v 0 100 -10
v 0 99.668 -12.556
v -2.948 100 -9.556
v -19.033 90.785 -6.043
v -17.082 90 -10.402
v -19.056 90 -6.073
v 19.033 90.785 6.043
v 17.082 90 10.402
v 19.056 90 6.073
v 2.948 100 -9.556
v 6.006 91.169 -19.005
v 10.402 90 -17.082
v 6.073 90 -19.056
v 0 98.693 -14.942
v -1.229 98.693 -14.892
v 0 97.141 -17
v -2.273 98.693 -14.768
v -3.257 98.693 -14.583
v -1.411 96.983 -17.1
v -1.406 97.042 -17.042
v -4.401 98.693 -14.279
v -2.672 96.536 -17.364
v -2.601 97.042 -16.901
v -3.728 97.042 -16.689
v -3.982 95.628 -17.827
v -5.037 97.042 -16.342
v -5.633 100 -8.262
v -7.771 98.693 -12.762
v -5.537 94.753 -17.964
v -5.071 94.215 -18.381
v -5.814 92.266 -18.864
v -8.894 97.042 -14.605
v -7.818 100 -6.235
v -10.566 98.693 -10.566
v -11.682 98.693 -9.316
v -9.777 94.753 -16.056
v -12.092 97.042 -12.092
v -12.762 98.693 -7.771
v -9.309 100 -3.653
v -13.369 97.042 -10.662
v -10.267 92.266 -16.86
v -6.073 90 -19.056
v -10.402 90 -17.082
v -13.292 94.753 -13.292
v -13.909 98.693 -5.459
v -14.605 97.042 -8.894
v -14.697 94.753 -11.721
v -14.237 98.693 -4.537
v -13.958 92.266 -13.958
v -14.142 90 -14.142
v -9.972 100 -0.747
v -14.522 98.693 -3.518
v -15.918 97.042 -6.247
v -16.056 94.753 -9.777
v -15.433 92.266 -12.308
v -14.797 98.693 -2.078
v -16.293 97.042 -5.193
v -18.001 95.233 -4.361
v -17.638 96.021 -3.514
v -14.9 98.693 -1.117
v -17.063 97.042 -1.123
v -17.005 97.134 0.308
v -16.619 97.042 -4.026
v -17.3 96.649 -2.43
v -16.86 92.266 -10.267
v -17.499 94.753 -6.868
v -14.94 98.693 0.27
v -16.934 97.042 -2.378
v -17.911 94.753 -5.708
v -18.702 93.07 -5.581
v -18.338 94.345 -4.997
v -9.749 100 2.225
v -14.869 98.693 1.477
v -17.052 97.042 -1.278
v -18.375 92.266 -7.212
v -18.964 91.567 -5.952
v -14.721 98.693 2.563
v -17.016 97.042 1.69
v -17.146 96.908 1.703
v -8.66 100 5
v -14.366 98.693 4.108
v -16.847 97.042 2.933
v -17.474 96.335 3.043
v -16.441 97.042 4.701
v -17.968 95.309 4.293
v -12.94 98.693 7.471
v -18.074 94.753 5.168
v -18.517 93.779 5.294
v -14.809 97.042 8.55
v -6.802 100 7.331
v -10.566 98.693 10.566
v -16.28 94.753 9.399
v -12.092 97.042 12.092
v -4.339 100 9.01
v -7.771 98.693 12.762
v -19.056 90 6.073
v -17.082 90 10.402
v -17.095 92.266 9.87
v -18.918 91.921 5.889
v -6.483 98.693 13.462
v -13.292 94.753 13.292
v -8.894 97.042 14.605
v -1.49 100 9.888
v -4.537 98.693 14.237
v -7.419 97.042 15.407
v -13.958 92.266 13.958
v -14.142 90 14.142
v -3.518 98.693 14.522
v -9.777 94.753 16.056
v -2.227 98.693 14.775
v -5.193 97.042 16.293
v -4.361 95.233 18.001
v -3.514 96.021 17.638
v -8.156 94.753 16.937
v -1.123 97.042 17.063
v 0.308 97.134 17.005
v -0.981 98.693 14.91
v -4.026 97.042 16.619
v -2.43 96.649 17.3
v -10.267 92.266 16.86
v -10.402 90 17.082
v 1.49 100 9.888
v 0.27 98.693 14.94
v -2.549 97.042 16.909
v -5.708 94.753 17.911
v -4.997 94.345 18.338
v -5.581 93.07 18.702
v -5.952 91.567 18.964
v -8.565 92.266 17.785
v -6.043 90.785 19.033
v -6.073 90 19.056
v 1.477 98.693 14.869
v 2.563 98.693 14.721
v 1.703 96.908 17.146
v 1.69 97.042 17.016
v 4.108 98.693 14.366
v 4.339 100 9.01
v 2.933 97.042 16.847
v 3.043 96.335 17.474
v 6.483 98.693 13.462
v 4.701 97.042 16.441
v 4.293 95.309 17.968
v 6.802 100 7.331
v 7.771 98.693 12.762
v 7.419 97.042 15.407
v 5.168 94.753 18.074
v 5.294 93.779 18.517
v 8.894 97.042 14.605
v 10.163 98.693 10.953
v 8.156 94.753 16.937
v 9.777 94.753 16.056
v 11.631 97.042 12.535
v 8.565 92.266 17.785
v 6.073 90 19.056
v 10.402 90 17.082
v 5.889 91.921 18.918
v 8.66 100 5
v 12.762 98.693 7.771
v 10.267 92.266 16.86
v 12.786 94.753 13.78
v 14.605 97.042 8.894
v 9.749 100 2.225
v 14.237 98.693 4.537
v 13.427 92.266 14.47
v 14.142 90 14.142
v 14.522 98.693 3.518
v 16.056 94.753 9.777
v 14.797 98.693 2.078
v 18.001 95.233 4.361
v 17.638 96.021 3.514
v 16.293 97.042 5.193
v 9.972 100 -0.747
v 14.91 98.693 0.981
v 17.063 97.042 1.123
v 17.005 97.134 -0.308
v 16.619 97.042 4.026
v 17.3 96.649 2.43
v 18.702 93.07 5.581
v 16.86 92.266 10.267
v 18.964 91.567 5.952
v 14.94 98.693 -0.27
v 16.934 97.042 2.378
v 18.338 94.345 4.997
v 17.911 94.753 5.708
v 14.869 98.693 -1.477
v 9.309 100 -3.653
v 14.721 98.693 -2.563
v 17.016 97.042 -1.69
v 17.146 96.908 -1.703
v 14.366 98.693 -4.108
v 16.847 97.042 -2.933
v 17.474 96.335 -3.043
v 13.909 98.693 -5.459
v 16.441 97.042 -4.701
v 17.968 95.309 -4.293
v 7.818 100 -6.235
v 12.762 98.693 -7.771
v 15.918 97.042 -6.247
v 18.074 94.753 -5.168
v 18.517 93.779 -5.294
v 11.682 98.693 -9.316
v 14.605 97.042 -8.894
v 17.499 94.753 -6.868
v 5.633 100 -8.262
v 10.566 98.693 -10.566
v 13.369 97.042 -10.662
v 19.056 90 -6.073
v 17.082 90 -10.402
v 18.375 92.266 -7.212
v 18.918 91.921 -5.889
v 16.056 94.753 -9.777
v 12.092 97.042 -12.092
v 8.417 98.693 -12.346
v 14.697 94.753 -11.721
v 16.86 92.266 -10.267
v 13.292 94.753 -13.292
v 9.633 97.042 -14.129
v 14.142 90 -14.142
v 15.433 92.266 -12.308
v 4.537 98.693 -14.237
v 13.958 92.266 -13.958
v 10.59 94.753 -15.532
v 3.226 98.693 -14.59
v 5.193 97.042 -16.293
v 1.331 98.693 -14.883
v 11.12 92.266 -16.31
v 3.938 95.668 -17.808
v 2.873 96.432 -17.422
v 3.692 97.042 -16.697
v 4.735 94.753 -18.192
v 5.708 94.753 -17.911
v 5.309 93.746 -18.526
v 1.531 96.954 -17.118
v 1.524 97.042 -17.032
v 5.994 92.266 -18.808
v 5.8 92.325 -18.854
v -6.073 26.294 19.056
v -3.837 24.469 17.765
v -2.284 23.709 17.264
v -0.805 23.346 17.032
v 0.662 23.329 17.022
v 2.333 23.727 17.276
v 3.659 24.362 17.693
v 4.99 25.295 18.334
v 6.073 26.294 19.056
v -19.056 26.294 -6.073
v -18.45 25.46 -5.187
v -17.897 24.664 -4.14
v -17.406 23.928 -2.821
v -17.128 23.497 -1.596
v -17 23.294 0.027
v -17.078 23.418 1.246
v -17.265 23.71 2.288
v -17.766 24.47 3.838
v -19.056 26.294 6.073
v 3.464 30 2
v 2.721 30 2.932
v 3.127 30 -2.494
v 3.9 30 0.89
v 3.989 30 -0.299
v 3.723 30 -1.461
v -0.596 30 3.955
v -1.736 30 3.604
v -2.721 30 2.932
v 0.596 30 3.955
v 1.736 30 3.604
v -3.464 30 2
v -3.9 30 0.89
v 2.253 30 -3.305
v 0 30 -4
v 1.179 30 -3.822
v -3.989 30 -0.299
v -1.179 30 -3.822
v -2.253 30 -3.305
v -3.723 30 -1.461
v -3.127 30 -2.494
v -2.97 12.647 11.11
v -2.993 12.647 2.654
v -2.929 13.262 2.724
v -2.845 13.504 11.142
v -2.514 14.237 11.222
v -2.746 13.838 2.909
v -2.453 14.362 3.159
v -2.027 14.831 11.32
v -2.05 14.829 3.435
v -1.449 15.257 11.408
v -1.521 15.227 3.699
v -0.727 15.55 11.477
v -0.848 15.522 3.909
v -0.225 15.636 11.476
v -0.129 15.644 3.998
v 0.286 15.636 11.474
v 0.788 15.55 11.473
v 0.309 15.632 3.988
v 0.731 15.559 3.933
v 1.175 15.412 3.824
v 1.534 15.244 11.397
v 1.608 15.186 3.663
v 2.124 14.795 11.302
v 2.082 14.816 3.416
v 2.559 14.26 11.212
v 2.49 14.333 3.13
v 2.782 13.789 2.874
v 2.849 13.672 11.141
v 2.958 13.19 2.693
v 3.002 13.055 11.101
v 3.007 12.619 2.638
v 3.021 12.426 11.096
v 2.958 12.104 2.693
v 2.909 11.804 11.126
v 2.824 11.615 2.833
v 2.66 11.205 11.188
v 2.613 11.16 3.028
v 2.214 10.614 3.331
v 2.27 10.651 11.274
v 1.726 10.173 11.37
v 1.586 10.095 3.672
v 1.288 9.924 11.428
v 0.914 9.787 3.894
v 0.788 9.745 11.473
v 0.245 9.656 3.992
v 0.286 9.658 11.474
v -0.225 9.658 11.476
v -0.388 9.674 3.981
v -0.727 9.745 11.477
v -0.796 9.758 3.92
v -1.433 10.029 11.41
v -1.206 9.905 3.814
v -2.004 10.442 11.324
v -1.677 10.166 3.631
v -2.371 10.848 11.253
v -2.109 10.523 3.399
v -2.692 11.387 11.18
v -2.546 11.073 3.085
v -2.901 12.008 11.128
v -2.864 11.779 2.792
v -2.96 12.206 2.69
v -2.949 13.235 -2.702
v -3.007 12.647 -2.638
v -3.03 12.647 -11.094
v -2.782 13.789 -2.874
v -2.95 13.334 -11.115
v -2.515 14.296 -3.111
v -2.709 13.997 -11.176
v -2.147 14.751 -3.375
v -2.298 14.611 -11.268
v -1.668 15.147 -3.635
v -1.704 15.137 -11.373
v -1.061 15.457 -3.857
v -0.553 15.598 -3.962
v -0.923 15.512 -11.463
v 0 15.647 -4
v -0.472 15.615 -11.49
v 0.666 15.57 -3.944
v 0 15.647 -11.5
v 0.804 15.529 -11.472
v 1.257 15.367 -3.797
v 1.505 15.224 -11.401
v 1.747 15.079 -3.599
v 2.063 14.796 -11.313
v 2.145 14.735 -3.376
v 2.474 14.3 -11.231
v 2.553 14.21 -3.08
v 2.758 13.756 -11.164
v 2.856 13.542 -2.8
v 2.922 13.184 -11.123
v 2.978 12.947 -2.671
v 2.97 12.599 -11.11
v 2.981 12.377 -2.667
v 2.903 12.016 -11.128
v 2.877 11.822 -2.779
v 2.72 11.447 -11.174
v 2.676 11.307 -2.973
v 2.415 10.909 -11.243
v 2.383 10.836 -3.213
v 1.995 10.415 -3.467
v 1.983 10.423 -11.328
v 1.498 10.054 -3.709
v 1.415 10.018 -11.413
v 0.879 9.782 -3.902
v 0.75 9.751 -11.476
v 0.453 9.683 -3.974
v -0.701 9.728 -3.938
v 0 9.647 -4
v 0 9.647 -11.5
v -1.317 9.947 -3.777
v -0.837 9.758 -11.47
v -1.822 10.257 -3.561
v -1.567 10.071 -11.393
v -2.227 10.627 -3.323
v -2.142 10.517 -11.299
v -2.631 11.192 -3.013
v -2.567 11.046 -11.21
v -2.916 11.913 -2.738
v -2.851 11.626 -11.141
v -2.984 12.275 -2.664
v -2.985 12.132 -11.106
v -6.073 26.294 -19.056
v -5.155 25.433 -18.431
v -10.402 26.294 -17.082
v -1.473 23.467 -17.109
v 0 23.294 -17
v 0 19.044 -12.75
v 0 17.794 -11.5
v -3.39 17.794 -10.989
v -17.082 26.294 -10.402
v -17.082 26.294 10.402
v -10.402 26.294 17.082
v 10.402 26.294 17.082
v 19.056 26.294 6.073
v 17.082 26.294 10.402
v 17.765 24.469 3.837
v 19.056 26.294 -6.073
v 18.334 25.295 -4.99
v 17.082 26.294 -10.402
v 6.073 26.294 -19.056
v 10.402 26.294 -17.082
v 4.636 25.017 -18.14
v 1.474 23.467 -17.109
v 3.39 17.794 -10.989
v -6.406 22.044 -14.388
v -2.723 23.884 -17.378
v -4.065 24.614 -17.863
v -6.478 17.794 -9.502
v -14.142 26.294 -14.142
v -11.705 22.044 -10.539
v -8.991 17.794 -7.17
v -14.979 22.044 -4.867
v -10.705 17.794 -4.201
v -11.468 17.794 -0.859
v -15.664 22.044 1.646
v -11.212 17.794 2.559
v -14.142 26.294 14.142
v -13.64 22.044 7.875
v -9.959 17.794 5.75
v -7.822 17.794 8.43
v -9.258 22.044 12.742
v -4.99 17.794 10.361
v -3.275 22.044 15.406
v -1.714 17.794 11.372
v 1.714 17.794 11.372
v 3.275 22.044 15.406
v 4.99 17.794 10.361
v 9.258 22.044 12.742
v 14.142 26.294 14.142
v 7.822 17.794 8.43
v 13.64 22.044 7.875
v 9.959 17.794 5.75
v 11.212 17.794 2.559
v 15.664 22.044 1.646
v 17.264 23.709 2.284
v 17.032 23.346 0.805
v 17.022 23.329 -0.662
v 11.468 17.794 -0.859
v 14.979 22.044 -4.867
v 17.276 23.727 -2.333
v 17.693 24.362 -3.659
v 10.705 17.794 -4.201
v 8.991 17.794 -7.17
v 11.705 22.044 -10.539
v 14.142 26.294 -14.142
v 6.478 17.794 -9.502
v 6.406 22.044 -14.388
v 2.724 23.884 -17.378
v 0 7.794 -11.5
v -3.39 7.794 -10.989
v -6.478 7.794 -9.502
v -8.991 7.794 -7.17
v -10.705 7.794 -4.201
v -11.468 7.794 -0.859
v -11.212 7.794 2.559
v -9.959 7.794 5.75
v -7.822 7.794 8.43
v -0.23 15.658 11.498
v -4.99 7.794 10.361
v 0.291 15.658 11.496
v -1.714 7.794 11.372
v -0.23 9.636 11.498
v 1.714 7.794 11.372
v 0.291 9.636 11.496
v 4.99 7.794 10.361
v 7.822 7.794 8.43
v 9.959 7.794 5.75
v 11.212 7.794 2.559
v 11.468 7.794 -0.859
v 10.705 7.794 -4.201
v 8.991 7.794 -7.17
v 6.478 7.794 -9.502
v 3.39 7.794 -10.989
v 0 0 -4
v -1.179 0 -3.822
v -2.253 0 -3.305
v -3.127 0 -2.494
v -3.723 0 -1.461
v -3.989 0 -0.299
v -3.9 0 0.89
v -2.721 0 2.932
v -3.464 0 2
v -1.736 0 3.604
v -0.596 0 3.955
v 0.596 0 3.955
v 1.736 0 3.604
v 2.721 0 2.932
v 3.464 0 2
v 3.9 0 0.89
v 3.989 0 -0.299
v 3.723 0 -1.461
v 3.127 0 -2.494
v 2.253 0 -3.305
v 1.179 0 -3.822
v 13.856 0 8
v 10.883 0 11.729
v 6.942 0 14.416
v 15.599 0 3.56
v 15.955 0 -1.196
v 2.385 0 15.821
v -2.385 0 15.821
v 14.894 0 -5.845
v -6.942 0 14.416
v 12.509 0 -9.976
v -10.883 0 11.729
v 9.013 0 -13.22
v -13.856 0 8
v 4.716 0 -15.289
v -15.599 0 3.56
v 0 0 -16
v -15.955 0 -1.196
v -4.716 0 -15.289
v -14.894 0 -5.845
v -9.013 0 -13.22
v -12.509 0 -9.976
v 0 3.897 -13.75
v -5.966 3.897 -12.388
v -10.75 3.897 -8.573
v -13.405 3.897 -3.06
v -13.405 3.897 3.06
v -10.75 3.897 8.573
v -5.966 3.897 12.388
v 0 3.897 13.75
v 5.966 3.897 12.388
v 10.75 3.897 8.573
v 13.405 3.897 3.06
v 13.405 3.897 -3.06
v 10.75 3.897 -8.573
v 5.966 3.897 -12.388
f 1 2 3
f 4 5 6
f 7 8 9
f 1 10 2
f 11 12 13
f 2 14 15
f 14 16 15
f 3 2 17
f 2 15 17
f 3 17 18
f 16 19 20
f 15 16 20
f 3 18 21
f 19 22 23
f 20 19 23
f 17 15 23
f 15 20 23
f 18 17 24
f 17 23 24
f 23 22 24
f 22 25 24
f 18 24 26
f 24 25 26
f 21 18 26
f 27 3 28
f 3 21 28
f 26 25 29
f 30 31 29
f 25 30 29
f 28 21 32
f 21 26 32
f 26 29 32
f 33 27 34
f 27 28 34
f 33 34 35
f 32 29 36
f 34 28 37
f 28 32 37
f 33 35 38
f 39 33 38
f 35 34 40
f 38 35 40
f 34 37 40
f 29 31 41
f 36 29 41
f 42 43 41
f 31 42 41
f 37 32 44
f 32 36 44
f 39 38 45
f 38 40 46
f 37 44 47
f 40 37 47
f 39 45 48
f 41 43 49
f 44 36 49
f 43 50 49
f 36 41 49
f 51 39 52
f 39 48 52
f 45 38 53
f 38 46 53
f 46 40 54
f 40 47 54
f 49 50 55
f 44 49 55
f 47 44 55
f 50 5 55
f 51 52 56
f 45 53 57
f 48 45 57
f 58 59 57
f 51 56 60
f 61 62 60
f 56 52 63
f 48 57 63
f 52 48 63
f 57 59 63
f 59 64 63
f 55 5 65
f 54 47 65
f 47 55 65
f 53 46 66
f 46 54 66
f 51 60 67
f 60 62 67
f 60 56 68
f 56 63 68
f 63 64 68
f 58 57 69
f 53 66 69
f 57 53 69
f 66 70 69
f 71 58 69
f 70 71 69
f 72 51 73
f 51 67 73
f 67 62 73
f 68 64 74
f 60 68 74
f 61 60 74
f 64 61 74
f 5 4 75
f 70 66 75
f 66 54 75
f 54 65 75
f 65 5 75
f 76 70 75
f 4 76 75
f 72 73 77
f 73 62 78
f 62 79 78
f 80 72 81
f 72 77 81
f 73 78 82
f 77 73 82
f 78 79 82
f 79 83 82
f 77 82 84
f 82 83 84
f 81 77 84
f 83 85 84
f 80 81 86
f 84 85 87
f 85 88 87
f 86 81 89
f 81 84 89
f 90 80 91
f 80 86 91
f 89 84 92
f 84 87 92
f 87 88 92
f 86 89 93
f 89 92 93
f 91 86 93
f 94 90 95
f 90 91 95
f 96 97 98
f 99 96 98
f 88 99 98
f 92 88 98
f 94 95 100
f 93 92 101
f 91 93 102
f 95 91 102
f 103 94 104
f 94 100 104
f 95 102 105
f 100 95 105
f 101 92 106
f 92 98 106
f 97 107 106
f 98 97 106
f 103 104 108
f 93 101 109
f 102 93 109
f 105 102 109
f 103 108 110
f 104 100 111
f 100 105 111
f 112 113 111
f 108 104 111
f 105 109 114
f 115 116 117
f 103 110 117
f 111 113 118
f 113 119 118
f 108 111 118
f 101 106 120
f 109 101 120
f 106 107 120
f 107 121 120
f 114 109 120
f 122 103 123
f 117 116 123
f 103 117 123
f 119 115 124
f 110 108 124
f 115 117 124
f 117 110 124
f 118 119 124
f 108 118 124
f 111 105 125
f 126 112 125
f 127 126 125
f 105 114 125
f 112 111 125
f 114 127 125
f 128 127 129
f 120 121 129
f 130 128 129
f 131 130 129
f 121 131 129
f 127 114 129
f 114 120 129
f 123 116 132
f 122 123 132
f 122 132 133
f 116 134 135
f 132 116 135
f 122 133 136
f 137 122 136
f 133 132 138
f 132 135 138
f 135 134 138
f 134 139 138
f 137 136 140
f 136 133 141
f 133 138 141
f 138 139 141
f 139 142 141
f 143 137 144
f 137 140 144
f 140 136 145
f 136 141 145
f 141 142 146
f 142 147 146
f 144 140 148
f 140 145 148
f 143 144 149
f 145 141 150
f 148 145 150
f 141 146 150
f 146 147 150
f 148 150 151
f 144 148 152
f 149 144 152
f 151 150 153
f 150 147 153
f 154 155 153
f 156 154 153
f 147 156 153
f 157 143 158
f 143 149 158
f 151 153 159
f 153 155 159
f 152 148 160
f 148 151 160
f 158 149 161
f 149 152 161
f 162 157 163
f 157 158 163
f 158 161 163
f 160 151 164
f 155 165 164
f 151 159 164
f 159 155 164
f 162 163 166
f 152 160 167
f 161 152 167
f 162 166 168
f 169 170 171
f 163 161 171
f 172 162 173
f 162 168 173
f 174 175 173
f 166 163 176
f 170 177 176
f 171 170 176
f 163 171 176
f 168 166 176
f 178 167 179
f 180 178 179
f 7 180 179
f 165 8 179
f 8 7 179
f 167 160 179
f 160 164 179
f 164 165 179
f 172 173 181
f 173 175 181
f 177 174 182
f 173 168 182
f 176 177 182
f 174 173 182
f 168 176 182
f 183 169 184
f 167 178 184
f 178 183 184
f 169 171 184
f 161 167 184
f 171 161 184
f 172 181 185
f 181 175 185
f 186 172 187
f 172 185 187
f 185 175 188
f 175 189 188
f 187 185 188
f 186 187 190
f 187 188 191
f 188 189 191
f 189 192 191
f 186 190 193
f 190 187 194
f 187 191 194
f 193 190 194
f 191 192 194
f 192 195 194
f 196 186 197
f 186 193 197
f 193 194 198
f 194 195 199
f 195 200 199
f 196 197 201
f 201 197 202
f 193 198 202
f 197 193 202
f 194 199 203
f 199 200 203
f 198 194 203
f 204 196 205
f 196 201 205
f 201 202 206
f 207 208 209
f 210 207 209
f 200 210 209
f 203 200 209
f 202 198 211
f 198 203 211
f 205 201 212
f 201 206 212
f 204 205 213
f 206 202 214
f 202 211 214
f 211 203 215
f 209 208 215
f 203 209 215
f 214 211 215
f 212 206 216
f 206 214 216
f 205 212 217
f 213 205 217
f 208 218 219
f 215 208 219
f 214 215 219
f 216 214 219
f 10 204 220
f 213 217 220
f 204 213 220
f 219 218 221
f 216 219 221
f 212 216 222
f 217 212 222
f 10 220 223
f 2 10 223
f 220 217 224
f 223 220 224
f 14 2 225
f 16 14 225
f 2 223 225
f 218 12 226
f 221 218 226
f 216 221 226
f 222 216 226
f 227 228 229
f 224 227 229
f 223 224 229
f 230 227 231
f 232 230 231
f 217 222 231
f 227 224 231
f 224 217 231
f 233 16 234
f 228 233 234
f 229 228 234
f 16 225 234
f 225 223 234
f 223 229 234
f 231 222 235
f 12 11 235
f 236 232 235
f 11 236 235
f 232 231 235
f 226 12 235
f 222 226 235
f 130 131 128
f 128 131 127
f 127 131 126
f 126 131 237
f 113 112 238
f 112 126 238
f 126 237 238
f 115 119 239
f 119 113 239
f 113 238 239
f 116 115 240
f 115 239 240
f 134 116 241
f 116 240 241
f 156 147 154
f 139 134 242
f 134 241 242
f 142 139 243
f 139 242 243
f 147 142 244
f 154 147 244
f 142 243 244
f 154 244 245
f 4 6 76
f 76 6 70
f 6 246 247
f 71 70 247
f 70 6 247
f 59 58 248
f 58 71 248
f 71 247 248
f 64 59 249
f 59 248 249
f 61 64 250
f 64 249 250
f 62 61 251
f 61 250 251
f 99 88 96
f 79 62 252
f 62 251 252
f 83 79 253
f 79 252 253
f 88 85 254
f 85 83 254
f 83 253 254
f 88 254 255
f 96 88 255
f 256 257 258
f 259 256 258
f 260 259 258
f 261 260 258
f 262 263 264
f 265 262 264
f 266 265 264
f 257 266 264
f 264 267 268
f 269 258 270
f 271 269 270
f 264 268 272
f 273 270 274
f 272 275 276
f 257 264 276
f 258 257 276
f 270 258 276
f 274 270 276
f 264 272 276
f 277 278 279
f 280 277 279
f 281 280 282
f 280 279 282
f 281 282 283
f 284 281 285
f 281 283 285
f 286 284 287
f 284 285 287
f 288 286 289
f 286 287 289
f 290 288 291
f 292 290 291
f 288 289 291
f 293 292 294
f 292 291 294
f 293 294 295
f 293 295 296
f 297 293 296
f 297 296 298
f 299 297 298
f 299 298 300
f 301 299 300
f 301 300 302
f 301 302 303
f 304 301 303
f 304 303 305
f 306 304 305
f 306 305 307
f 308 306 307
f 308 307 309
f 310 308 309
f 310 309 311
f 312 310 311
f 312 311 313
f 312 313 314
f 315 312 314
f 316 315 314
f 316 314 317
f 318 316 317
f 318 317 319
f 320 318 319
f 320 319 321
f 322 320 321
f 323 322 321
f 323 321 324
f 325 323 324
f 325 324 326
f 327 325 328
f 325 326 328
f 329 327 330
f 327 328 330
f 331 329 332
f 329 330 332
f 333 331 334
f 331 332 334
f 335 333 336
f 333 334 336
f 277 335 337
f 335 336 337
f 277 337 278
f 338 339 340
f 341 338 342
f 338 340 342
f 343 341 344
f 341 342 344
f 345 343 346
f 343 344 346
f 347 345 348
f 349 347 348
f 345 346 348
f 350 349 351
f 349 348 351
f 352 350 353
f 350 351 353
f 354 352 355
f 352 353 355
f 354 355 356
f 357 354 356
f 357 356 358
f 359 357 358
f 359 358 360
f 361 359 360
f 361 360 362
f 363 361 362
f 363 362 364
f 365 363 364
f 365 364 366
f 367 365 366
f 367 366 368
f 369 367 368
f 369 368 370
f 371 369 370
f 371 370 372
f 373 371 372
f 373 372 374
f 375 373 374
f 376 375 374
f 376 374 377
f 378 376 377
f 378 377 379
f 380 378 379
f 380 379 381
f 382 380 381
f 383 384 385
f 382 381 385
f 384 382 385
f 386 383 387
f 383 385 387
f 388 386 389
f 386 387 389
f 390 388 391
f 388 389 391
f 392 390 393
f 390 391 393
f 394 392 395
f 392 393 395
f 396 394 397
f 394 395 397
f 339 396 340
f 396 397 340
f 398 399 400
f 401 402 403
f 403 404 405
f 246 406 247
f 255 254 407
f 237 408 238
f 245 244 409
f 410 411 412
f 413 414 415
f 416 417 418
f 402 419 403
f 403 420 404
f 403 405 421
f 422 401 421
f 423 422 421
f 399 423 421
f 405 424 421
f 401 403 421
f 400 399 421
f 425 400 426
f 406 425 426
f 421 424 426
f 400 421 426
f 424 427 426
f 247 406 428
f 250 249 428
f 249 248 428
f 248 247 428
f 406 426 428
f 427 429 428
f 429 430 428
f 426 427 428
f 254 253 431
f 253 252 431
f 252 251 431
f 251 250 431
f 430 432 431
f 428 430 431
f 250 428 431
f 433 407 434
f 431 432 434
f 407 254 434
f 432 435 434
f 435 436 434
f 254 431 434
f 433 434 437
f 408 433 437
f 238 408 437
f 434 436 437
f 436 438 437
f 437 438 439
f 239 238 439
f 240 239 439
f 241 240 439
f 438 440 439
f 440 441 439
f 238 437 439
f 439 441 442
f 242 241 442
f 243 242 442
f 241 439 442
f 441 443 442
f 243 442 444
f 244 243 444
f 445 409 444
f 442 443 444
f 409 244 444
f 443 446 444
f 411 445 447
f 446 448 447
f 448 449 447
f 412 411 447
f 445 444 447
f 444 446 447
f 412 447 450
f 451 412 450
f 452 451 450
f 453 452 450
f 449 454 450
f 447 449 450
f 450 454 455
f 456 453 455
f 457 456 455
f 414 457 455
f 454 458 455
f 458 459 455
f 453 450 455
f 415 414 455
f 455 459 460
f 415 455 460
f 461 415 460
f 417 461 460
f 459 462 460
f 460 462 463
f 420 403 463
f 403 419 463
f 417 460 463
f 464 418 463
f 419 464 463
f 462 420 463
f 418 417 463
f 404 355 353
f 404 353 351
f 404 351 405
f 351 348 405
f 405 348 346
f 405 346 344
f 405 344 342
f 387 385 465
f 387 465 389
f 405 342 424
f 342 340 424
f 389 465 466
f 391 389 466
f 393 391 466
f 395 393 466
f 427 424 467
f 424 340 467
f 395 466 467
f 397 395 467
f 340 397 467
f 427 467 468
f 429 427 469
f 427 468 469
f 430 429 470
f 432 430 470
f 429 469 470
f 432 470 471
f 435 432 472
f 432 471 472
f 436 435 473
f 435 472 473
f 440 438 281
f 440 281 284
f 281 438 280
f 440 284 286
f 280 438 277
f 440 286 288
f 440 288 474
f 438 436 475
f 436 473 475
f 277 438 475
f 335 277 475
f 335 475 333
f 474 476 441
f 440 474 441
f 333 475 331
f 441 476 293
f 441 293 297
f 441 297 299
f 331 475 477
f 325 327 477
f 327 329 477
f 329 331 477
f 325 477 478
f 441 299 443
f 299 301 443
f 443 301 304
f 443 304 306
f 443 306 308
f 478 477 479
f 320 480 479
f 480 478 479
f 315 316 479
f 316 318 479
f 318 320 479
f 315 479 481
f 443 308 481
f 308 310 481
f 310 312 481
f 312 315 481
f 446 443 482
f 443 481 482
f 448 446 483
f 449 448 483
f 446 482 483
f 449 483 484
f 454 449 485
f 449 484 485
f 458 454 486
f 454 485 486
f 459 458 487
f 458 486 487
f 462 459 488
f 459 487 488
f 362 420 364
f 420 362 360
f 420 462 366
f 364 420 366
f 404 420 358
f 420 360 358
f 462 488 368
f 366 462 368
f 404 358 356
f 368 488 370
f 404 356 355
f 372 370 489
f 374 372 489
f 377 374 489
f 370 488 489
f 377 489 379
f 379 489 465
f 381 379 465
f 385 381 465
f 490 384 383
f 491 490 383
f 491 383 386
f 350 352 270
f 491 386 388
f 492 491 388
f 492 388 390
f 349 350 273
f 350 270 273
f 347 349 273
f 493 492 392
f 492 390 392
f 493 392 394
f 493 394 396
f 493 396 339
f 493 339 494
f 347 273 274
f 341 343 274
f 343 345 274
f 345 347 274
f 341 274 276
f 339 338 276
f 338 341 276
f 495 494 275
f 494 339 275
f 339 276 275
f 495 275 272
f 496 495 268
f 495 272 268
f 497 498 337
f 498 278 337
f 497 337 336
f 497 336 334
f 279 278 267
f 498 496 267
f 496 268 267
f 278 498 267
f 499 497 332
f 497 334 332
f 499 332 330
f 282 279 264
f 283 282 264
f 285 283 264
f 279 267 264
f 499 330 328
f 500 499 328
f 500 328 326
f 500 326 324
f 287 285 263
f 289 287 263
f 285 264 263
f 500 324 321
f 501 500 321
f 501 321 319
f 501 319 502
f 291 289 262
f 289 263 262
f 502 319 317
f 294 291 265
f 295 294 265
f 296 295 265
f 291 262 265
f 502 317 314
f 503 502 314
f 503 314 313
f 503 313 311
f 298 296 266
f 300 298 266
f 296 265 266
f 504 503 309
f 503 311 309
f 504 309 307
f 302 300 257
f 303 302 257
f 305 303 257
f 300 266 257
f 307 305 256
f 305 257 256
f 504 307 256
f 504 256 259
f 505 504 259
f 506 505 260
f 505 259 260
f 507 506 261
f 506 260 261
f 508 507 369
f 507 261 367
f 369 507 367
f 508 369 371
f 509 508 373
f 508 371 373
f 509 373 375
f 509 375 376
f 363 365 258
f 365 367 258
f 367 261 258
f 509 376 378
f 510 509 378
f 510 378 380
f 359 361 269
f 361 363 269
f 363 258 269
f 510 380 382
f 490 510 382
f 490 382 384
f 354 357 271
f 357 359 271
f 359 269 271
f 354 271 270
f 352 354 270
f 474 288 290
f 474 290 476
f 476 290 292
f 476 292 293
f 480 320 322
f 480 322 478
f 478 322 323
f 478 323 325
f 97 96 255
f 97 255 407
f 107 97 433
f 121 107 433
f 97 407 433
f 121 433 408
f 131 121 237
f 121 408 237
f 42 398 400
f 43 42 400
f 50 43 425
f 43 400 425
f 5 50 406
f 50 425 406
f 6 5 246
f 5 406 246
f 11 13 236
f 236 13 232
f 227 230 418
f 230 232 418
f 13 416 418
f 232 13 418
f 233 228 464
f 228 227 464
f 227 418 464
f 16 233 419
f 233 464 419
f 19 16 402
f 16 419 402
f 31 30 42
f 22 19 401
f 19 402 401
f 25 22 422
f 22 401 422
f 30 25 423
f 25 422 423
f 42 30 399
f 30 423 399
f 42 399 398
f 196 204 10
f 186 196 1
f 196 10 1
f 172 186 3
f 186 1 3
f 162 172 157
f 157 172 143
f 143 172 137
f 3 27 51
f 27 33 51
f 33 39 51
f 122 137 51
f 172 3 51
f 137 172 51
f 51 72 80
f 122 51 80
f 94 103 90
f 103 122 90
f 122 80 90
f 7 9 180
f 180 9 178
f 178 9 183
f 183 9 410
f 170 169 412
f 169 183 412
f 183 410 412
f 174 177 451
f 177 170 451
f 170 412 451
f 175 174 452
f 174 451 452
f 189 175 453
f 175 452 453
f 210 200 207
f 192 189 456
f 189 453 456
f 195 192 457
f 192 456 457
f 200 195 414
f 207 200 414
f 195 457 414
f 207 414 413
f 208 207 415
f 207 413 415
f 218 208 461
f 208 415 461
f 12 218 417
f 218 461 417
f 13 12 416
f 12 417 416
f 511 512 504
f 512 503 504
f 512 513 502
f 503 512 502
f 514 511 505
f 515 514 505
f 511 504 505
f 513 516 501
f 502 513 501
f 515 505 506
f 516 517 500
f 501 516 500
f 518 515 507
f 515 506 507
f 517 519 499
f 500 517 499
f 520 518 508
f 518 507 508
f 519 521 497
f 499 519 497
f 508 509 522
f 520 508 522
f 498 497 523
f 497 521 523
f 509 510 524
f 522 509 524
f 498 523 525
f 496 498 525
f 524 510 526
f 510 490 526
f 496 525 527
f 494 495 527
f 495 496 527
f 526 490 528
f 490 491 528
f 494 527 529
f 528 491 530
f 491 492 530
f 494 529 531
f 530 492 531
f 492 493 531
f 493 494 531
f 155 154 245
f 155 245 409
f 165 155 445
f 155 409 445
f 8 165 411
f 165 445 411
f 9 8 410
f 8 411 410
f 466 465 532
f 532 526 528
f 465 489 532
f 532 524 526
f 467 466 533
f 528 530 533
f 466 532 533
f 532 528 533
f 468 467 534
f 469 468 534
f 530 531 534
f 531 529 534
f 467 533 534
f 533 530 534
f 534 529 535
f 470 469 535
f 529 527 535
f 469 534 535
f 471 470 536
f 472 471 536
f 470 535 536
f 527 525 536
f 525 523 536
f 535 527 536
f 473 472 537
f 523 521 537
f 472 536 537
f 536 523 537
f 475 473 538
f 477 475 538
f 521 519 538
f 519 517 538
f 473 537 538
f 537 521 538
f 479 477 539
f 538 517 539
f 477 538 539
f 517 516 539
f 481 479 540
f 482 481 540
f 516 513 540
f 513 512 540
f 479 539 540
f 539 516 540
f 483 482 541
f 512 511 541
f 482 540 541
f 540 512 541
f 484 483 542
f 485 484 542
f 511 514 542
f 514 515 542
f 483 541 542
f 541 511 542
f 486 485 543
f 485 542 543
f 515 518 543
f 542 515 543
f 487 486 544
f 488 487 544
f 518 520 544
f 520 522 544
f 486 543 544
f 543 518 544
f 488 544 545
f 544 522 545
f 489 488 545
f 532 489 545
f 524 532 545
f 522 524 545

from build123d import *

# Parameters (mm, degrees)
SKETCH3_R                       = 10
CUT_EXTRUDE1_DEPTH              = 104.923048473
F_6_0MM_DOWEL_HOLE1_D           = 6
F_6_0MM_DOWEL_HOLE1_CSINK_D     = 6.05
F_6_0MM_DOWEL_HOLE1_CSINK_ANGLE = 90


with BuildPart() as part:
    # Sketch2 → Revolve1 (revolve)
    with BuildSketch(Plane.XY, mode=Mode.PRIVATE) as revolve1_sk:
        with BuildLine():
            Line((4, 0), (4, 30))
            Line((4, 30), (0, 30))
            Line((0, 30), (0, 100))
            Line((0, 100), (10, 100))
            ThreePointArc((10, 100), (17.071067812, 97.071067812), (20, 90))
            Line((20, 90), (20, 26.294228634))
            Line((20, 26.294228634), (11.5, 17.794228634))
            Line((11.5, 17.794228634), (11.5, 7.794228634))
            Line((11.5, 7.794228634), (16, 0))
            Line((16, 0), (4, 0))
        make_face()
    revolve(revolve1_sk.sketch.rotate(Axis((0, 30, 0), (0, 1, 0)), 90), axis=Axis((0, 30, 0), (0, 1, 0)))

    # Sketch3 → Cut-Extrude1 (cut, through all)
    with BuildSketch(Plane.XZ):
        with Locations((0, 27)):
            Circle(SKETCH3_R)
        with Locations((27, 0)):
            Circle(SKETCH3_R)
        with Locations((0, -27)):
            Circle(SKETCH3_R)
        with Locations((-27, 0)):
            Circle(SKETCH3_R)
    extrude(amount=-CUT_EXTRUDE1_DEPTH, mode=Mode.SUBTRACT)

    # Ø6.0mm Dowel Hole1 (through all)
    with Locations(Plane(origin=(0.030615993, 12.647260725, 11.499959246), x_dir=(0.999996456179, 0, -0.002662260256), z_dir=(0.002662260256, 0, 0.999996456179))):
        with Locations((0, 0)):
            CounterSinkHole(F_6_0MM_DOWEL_HOLE1_D / 2, F_6_0MM_DOWEL_HOLE1_CSINK_D / 2, counter_sink_angle=F_6_0MM_DOWEL_HOLE1_CSINK_ANGLE)


solid = part.part
